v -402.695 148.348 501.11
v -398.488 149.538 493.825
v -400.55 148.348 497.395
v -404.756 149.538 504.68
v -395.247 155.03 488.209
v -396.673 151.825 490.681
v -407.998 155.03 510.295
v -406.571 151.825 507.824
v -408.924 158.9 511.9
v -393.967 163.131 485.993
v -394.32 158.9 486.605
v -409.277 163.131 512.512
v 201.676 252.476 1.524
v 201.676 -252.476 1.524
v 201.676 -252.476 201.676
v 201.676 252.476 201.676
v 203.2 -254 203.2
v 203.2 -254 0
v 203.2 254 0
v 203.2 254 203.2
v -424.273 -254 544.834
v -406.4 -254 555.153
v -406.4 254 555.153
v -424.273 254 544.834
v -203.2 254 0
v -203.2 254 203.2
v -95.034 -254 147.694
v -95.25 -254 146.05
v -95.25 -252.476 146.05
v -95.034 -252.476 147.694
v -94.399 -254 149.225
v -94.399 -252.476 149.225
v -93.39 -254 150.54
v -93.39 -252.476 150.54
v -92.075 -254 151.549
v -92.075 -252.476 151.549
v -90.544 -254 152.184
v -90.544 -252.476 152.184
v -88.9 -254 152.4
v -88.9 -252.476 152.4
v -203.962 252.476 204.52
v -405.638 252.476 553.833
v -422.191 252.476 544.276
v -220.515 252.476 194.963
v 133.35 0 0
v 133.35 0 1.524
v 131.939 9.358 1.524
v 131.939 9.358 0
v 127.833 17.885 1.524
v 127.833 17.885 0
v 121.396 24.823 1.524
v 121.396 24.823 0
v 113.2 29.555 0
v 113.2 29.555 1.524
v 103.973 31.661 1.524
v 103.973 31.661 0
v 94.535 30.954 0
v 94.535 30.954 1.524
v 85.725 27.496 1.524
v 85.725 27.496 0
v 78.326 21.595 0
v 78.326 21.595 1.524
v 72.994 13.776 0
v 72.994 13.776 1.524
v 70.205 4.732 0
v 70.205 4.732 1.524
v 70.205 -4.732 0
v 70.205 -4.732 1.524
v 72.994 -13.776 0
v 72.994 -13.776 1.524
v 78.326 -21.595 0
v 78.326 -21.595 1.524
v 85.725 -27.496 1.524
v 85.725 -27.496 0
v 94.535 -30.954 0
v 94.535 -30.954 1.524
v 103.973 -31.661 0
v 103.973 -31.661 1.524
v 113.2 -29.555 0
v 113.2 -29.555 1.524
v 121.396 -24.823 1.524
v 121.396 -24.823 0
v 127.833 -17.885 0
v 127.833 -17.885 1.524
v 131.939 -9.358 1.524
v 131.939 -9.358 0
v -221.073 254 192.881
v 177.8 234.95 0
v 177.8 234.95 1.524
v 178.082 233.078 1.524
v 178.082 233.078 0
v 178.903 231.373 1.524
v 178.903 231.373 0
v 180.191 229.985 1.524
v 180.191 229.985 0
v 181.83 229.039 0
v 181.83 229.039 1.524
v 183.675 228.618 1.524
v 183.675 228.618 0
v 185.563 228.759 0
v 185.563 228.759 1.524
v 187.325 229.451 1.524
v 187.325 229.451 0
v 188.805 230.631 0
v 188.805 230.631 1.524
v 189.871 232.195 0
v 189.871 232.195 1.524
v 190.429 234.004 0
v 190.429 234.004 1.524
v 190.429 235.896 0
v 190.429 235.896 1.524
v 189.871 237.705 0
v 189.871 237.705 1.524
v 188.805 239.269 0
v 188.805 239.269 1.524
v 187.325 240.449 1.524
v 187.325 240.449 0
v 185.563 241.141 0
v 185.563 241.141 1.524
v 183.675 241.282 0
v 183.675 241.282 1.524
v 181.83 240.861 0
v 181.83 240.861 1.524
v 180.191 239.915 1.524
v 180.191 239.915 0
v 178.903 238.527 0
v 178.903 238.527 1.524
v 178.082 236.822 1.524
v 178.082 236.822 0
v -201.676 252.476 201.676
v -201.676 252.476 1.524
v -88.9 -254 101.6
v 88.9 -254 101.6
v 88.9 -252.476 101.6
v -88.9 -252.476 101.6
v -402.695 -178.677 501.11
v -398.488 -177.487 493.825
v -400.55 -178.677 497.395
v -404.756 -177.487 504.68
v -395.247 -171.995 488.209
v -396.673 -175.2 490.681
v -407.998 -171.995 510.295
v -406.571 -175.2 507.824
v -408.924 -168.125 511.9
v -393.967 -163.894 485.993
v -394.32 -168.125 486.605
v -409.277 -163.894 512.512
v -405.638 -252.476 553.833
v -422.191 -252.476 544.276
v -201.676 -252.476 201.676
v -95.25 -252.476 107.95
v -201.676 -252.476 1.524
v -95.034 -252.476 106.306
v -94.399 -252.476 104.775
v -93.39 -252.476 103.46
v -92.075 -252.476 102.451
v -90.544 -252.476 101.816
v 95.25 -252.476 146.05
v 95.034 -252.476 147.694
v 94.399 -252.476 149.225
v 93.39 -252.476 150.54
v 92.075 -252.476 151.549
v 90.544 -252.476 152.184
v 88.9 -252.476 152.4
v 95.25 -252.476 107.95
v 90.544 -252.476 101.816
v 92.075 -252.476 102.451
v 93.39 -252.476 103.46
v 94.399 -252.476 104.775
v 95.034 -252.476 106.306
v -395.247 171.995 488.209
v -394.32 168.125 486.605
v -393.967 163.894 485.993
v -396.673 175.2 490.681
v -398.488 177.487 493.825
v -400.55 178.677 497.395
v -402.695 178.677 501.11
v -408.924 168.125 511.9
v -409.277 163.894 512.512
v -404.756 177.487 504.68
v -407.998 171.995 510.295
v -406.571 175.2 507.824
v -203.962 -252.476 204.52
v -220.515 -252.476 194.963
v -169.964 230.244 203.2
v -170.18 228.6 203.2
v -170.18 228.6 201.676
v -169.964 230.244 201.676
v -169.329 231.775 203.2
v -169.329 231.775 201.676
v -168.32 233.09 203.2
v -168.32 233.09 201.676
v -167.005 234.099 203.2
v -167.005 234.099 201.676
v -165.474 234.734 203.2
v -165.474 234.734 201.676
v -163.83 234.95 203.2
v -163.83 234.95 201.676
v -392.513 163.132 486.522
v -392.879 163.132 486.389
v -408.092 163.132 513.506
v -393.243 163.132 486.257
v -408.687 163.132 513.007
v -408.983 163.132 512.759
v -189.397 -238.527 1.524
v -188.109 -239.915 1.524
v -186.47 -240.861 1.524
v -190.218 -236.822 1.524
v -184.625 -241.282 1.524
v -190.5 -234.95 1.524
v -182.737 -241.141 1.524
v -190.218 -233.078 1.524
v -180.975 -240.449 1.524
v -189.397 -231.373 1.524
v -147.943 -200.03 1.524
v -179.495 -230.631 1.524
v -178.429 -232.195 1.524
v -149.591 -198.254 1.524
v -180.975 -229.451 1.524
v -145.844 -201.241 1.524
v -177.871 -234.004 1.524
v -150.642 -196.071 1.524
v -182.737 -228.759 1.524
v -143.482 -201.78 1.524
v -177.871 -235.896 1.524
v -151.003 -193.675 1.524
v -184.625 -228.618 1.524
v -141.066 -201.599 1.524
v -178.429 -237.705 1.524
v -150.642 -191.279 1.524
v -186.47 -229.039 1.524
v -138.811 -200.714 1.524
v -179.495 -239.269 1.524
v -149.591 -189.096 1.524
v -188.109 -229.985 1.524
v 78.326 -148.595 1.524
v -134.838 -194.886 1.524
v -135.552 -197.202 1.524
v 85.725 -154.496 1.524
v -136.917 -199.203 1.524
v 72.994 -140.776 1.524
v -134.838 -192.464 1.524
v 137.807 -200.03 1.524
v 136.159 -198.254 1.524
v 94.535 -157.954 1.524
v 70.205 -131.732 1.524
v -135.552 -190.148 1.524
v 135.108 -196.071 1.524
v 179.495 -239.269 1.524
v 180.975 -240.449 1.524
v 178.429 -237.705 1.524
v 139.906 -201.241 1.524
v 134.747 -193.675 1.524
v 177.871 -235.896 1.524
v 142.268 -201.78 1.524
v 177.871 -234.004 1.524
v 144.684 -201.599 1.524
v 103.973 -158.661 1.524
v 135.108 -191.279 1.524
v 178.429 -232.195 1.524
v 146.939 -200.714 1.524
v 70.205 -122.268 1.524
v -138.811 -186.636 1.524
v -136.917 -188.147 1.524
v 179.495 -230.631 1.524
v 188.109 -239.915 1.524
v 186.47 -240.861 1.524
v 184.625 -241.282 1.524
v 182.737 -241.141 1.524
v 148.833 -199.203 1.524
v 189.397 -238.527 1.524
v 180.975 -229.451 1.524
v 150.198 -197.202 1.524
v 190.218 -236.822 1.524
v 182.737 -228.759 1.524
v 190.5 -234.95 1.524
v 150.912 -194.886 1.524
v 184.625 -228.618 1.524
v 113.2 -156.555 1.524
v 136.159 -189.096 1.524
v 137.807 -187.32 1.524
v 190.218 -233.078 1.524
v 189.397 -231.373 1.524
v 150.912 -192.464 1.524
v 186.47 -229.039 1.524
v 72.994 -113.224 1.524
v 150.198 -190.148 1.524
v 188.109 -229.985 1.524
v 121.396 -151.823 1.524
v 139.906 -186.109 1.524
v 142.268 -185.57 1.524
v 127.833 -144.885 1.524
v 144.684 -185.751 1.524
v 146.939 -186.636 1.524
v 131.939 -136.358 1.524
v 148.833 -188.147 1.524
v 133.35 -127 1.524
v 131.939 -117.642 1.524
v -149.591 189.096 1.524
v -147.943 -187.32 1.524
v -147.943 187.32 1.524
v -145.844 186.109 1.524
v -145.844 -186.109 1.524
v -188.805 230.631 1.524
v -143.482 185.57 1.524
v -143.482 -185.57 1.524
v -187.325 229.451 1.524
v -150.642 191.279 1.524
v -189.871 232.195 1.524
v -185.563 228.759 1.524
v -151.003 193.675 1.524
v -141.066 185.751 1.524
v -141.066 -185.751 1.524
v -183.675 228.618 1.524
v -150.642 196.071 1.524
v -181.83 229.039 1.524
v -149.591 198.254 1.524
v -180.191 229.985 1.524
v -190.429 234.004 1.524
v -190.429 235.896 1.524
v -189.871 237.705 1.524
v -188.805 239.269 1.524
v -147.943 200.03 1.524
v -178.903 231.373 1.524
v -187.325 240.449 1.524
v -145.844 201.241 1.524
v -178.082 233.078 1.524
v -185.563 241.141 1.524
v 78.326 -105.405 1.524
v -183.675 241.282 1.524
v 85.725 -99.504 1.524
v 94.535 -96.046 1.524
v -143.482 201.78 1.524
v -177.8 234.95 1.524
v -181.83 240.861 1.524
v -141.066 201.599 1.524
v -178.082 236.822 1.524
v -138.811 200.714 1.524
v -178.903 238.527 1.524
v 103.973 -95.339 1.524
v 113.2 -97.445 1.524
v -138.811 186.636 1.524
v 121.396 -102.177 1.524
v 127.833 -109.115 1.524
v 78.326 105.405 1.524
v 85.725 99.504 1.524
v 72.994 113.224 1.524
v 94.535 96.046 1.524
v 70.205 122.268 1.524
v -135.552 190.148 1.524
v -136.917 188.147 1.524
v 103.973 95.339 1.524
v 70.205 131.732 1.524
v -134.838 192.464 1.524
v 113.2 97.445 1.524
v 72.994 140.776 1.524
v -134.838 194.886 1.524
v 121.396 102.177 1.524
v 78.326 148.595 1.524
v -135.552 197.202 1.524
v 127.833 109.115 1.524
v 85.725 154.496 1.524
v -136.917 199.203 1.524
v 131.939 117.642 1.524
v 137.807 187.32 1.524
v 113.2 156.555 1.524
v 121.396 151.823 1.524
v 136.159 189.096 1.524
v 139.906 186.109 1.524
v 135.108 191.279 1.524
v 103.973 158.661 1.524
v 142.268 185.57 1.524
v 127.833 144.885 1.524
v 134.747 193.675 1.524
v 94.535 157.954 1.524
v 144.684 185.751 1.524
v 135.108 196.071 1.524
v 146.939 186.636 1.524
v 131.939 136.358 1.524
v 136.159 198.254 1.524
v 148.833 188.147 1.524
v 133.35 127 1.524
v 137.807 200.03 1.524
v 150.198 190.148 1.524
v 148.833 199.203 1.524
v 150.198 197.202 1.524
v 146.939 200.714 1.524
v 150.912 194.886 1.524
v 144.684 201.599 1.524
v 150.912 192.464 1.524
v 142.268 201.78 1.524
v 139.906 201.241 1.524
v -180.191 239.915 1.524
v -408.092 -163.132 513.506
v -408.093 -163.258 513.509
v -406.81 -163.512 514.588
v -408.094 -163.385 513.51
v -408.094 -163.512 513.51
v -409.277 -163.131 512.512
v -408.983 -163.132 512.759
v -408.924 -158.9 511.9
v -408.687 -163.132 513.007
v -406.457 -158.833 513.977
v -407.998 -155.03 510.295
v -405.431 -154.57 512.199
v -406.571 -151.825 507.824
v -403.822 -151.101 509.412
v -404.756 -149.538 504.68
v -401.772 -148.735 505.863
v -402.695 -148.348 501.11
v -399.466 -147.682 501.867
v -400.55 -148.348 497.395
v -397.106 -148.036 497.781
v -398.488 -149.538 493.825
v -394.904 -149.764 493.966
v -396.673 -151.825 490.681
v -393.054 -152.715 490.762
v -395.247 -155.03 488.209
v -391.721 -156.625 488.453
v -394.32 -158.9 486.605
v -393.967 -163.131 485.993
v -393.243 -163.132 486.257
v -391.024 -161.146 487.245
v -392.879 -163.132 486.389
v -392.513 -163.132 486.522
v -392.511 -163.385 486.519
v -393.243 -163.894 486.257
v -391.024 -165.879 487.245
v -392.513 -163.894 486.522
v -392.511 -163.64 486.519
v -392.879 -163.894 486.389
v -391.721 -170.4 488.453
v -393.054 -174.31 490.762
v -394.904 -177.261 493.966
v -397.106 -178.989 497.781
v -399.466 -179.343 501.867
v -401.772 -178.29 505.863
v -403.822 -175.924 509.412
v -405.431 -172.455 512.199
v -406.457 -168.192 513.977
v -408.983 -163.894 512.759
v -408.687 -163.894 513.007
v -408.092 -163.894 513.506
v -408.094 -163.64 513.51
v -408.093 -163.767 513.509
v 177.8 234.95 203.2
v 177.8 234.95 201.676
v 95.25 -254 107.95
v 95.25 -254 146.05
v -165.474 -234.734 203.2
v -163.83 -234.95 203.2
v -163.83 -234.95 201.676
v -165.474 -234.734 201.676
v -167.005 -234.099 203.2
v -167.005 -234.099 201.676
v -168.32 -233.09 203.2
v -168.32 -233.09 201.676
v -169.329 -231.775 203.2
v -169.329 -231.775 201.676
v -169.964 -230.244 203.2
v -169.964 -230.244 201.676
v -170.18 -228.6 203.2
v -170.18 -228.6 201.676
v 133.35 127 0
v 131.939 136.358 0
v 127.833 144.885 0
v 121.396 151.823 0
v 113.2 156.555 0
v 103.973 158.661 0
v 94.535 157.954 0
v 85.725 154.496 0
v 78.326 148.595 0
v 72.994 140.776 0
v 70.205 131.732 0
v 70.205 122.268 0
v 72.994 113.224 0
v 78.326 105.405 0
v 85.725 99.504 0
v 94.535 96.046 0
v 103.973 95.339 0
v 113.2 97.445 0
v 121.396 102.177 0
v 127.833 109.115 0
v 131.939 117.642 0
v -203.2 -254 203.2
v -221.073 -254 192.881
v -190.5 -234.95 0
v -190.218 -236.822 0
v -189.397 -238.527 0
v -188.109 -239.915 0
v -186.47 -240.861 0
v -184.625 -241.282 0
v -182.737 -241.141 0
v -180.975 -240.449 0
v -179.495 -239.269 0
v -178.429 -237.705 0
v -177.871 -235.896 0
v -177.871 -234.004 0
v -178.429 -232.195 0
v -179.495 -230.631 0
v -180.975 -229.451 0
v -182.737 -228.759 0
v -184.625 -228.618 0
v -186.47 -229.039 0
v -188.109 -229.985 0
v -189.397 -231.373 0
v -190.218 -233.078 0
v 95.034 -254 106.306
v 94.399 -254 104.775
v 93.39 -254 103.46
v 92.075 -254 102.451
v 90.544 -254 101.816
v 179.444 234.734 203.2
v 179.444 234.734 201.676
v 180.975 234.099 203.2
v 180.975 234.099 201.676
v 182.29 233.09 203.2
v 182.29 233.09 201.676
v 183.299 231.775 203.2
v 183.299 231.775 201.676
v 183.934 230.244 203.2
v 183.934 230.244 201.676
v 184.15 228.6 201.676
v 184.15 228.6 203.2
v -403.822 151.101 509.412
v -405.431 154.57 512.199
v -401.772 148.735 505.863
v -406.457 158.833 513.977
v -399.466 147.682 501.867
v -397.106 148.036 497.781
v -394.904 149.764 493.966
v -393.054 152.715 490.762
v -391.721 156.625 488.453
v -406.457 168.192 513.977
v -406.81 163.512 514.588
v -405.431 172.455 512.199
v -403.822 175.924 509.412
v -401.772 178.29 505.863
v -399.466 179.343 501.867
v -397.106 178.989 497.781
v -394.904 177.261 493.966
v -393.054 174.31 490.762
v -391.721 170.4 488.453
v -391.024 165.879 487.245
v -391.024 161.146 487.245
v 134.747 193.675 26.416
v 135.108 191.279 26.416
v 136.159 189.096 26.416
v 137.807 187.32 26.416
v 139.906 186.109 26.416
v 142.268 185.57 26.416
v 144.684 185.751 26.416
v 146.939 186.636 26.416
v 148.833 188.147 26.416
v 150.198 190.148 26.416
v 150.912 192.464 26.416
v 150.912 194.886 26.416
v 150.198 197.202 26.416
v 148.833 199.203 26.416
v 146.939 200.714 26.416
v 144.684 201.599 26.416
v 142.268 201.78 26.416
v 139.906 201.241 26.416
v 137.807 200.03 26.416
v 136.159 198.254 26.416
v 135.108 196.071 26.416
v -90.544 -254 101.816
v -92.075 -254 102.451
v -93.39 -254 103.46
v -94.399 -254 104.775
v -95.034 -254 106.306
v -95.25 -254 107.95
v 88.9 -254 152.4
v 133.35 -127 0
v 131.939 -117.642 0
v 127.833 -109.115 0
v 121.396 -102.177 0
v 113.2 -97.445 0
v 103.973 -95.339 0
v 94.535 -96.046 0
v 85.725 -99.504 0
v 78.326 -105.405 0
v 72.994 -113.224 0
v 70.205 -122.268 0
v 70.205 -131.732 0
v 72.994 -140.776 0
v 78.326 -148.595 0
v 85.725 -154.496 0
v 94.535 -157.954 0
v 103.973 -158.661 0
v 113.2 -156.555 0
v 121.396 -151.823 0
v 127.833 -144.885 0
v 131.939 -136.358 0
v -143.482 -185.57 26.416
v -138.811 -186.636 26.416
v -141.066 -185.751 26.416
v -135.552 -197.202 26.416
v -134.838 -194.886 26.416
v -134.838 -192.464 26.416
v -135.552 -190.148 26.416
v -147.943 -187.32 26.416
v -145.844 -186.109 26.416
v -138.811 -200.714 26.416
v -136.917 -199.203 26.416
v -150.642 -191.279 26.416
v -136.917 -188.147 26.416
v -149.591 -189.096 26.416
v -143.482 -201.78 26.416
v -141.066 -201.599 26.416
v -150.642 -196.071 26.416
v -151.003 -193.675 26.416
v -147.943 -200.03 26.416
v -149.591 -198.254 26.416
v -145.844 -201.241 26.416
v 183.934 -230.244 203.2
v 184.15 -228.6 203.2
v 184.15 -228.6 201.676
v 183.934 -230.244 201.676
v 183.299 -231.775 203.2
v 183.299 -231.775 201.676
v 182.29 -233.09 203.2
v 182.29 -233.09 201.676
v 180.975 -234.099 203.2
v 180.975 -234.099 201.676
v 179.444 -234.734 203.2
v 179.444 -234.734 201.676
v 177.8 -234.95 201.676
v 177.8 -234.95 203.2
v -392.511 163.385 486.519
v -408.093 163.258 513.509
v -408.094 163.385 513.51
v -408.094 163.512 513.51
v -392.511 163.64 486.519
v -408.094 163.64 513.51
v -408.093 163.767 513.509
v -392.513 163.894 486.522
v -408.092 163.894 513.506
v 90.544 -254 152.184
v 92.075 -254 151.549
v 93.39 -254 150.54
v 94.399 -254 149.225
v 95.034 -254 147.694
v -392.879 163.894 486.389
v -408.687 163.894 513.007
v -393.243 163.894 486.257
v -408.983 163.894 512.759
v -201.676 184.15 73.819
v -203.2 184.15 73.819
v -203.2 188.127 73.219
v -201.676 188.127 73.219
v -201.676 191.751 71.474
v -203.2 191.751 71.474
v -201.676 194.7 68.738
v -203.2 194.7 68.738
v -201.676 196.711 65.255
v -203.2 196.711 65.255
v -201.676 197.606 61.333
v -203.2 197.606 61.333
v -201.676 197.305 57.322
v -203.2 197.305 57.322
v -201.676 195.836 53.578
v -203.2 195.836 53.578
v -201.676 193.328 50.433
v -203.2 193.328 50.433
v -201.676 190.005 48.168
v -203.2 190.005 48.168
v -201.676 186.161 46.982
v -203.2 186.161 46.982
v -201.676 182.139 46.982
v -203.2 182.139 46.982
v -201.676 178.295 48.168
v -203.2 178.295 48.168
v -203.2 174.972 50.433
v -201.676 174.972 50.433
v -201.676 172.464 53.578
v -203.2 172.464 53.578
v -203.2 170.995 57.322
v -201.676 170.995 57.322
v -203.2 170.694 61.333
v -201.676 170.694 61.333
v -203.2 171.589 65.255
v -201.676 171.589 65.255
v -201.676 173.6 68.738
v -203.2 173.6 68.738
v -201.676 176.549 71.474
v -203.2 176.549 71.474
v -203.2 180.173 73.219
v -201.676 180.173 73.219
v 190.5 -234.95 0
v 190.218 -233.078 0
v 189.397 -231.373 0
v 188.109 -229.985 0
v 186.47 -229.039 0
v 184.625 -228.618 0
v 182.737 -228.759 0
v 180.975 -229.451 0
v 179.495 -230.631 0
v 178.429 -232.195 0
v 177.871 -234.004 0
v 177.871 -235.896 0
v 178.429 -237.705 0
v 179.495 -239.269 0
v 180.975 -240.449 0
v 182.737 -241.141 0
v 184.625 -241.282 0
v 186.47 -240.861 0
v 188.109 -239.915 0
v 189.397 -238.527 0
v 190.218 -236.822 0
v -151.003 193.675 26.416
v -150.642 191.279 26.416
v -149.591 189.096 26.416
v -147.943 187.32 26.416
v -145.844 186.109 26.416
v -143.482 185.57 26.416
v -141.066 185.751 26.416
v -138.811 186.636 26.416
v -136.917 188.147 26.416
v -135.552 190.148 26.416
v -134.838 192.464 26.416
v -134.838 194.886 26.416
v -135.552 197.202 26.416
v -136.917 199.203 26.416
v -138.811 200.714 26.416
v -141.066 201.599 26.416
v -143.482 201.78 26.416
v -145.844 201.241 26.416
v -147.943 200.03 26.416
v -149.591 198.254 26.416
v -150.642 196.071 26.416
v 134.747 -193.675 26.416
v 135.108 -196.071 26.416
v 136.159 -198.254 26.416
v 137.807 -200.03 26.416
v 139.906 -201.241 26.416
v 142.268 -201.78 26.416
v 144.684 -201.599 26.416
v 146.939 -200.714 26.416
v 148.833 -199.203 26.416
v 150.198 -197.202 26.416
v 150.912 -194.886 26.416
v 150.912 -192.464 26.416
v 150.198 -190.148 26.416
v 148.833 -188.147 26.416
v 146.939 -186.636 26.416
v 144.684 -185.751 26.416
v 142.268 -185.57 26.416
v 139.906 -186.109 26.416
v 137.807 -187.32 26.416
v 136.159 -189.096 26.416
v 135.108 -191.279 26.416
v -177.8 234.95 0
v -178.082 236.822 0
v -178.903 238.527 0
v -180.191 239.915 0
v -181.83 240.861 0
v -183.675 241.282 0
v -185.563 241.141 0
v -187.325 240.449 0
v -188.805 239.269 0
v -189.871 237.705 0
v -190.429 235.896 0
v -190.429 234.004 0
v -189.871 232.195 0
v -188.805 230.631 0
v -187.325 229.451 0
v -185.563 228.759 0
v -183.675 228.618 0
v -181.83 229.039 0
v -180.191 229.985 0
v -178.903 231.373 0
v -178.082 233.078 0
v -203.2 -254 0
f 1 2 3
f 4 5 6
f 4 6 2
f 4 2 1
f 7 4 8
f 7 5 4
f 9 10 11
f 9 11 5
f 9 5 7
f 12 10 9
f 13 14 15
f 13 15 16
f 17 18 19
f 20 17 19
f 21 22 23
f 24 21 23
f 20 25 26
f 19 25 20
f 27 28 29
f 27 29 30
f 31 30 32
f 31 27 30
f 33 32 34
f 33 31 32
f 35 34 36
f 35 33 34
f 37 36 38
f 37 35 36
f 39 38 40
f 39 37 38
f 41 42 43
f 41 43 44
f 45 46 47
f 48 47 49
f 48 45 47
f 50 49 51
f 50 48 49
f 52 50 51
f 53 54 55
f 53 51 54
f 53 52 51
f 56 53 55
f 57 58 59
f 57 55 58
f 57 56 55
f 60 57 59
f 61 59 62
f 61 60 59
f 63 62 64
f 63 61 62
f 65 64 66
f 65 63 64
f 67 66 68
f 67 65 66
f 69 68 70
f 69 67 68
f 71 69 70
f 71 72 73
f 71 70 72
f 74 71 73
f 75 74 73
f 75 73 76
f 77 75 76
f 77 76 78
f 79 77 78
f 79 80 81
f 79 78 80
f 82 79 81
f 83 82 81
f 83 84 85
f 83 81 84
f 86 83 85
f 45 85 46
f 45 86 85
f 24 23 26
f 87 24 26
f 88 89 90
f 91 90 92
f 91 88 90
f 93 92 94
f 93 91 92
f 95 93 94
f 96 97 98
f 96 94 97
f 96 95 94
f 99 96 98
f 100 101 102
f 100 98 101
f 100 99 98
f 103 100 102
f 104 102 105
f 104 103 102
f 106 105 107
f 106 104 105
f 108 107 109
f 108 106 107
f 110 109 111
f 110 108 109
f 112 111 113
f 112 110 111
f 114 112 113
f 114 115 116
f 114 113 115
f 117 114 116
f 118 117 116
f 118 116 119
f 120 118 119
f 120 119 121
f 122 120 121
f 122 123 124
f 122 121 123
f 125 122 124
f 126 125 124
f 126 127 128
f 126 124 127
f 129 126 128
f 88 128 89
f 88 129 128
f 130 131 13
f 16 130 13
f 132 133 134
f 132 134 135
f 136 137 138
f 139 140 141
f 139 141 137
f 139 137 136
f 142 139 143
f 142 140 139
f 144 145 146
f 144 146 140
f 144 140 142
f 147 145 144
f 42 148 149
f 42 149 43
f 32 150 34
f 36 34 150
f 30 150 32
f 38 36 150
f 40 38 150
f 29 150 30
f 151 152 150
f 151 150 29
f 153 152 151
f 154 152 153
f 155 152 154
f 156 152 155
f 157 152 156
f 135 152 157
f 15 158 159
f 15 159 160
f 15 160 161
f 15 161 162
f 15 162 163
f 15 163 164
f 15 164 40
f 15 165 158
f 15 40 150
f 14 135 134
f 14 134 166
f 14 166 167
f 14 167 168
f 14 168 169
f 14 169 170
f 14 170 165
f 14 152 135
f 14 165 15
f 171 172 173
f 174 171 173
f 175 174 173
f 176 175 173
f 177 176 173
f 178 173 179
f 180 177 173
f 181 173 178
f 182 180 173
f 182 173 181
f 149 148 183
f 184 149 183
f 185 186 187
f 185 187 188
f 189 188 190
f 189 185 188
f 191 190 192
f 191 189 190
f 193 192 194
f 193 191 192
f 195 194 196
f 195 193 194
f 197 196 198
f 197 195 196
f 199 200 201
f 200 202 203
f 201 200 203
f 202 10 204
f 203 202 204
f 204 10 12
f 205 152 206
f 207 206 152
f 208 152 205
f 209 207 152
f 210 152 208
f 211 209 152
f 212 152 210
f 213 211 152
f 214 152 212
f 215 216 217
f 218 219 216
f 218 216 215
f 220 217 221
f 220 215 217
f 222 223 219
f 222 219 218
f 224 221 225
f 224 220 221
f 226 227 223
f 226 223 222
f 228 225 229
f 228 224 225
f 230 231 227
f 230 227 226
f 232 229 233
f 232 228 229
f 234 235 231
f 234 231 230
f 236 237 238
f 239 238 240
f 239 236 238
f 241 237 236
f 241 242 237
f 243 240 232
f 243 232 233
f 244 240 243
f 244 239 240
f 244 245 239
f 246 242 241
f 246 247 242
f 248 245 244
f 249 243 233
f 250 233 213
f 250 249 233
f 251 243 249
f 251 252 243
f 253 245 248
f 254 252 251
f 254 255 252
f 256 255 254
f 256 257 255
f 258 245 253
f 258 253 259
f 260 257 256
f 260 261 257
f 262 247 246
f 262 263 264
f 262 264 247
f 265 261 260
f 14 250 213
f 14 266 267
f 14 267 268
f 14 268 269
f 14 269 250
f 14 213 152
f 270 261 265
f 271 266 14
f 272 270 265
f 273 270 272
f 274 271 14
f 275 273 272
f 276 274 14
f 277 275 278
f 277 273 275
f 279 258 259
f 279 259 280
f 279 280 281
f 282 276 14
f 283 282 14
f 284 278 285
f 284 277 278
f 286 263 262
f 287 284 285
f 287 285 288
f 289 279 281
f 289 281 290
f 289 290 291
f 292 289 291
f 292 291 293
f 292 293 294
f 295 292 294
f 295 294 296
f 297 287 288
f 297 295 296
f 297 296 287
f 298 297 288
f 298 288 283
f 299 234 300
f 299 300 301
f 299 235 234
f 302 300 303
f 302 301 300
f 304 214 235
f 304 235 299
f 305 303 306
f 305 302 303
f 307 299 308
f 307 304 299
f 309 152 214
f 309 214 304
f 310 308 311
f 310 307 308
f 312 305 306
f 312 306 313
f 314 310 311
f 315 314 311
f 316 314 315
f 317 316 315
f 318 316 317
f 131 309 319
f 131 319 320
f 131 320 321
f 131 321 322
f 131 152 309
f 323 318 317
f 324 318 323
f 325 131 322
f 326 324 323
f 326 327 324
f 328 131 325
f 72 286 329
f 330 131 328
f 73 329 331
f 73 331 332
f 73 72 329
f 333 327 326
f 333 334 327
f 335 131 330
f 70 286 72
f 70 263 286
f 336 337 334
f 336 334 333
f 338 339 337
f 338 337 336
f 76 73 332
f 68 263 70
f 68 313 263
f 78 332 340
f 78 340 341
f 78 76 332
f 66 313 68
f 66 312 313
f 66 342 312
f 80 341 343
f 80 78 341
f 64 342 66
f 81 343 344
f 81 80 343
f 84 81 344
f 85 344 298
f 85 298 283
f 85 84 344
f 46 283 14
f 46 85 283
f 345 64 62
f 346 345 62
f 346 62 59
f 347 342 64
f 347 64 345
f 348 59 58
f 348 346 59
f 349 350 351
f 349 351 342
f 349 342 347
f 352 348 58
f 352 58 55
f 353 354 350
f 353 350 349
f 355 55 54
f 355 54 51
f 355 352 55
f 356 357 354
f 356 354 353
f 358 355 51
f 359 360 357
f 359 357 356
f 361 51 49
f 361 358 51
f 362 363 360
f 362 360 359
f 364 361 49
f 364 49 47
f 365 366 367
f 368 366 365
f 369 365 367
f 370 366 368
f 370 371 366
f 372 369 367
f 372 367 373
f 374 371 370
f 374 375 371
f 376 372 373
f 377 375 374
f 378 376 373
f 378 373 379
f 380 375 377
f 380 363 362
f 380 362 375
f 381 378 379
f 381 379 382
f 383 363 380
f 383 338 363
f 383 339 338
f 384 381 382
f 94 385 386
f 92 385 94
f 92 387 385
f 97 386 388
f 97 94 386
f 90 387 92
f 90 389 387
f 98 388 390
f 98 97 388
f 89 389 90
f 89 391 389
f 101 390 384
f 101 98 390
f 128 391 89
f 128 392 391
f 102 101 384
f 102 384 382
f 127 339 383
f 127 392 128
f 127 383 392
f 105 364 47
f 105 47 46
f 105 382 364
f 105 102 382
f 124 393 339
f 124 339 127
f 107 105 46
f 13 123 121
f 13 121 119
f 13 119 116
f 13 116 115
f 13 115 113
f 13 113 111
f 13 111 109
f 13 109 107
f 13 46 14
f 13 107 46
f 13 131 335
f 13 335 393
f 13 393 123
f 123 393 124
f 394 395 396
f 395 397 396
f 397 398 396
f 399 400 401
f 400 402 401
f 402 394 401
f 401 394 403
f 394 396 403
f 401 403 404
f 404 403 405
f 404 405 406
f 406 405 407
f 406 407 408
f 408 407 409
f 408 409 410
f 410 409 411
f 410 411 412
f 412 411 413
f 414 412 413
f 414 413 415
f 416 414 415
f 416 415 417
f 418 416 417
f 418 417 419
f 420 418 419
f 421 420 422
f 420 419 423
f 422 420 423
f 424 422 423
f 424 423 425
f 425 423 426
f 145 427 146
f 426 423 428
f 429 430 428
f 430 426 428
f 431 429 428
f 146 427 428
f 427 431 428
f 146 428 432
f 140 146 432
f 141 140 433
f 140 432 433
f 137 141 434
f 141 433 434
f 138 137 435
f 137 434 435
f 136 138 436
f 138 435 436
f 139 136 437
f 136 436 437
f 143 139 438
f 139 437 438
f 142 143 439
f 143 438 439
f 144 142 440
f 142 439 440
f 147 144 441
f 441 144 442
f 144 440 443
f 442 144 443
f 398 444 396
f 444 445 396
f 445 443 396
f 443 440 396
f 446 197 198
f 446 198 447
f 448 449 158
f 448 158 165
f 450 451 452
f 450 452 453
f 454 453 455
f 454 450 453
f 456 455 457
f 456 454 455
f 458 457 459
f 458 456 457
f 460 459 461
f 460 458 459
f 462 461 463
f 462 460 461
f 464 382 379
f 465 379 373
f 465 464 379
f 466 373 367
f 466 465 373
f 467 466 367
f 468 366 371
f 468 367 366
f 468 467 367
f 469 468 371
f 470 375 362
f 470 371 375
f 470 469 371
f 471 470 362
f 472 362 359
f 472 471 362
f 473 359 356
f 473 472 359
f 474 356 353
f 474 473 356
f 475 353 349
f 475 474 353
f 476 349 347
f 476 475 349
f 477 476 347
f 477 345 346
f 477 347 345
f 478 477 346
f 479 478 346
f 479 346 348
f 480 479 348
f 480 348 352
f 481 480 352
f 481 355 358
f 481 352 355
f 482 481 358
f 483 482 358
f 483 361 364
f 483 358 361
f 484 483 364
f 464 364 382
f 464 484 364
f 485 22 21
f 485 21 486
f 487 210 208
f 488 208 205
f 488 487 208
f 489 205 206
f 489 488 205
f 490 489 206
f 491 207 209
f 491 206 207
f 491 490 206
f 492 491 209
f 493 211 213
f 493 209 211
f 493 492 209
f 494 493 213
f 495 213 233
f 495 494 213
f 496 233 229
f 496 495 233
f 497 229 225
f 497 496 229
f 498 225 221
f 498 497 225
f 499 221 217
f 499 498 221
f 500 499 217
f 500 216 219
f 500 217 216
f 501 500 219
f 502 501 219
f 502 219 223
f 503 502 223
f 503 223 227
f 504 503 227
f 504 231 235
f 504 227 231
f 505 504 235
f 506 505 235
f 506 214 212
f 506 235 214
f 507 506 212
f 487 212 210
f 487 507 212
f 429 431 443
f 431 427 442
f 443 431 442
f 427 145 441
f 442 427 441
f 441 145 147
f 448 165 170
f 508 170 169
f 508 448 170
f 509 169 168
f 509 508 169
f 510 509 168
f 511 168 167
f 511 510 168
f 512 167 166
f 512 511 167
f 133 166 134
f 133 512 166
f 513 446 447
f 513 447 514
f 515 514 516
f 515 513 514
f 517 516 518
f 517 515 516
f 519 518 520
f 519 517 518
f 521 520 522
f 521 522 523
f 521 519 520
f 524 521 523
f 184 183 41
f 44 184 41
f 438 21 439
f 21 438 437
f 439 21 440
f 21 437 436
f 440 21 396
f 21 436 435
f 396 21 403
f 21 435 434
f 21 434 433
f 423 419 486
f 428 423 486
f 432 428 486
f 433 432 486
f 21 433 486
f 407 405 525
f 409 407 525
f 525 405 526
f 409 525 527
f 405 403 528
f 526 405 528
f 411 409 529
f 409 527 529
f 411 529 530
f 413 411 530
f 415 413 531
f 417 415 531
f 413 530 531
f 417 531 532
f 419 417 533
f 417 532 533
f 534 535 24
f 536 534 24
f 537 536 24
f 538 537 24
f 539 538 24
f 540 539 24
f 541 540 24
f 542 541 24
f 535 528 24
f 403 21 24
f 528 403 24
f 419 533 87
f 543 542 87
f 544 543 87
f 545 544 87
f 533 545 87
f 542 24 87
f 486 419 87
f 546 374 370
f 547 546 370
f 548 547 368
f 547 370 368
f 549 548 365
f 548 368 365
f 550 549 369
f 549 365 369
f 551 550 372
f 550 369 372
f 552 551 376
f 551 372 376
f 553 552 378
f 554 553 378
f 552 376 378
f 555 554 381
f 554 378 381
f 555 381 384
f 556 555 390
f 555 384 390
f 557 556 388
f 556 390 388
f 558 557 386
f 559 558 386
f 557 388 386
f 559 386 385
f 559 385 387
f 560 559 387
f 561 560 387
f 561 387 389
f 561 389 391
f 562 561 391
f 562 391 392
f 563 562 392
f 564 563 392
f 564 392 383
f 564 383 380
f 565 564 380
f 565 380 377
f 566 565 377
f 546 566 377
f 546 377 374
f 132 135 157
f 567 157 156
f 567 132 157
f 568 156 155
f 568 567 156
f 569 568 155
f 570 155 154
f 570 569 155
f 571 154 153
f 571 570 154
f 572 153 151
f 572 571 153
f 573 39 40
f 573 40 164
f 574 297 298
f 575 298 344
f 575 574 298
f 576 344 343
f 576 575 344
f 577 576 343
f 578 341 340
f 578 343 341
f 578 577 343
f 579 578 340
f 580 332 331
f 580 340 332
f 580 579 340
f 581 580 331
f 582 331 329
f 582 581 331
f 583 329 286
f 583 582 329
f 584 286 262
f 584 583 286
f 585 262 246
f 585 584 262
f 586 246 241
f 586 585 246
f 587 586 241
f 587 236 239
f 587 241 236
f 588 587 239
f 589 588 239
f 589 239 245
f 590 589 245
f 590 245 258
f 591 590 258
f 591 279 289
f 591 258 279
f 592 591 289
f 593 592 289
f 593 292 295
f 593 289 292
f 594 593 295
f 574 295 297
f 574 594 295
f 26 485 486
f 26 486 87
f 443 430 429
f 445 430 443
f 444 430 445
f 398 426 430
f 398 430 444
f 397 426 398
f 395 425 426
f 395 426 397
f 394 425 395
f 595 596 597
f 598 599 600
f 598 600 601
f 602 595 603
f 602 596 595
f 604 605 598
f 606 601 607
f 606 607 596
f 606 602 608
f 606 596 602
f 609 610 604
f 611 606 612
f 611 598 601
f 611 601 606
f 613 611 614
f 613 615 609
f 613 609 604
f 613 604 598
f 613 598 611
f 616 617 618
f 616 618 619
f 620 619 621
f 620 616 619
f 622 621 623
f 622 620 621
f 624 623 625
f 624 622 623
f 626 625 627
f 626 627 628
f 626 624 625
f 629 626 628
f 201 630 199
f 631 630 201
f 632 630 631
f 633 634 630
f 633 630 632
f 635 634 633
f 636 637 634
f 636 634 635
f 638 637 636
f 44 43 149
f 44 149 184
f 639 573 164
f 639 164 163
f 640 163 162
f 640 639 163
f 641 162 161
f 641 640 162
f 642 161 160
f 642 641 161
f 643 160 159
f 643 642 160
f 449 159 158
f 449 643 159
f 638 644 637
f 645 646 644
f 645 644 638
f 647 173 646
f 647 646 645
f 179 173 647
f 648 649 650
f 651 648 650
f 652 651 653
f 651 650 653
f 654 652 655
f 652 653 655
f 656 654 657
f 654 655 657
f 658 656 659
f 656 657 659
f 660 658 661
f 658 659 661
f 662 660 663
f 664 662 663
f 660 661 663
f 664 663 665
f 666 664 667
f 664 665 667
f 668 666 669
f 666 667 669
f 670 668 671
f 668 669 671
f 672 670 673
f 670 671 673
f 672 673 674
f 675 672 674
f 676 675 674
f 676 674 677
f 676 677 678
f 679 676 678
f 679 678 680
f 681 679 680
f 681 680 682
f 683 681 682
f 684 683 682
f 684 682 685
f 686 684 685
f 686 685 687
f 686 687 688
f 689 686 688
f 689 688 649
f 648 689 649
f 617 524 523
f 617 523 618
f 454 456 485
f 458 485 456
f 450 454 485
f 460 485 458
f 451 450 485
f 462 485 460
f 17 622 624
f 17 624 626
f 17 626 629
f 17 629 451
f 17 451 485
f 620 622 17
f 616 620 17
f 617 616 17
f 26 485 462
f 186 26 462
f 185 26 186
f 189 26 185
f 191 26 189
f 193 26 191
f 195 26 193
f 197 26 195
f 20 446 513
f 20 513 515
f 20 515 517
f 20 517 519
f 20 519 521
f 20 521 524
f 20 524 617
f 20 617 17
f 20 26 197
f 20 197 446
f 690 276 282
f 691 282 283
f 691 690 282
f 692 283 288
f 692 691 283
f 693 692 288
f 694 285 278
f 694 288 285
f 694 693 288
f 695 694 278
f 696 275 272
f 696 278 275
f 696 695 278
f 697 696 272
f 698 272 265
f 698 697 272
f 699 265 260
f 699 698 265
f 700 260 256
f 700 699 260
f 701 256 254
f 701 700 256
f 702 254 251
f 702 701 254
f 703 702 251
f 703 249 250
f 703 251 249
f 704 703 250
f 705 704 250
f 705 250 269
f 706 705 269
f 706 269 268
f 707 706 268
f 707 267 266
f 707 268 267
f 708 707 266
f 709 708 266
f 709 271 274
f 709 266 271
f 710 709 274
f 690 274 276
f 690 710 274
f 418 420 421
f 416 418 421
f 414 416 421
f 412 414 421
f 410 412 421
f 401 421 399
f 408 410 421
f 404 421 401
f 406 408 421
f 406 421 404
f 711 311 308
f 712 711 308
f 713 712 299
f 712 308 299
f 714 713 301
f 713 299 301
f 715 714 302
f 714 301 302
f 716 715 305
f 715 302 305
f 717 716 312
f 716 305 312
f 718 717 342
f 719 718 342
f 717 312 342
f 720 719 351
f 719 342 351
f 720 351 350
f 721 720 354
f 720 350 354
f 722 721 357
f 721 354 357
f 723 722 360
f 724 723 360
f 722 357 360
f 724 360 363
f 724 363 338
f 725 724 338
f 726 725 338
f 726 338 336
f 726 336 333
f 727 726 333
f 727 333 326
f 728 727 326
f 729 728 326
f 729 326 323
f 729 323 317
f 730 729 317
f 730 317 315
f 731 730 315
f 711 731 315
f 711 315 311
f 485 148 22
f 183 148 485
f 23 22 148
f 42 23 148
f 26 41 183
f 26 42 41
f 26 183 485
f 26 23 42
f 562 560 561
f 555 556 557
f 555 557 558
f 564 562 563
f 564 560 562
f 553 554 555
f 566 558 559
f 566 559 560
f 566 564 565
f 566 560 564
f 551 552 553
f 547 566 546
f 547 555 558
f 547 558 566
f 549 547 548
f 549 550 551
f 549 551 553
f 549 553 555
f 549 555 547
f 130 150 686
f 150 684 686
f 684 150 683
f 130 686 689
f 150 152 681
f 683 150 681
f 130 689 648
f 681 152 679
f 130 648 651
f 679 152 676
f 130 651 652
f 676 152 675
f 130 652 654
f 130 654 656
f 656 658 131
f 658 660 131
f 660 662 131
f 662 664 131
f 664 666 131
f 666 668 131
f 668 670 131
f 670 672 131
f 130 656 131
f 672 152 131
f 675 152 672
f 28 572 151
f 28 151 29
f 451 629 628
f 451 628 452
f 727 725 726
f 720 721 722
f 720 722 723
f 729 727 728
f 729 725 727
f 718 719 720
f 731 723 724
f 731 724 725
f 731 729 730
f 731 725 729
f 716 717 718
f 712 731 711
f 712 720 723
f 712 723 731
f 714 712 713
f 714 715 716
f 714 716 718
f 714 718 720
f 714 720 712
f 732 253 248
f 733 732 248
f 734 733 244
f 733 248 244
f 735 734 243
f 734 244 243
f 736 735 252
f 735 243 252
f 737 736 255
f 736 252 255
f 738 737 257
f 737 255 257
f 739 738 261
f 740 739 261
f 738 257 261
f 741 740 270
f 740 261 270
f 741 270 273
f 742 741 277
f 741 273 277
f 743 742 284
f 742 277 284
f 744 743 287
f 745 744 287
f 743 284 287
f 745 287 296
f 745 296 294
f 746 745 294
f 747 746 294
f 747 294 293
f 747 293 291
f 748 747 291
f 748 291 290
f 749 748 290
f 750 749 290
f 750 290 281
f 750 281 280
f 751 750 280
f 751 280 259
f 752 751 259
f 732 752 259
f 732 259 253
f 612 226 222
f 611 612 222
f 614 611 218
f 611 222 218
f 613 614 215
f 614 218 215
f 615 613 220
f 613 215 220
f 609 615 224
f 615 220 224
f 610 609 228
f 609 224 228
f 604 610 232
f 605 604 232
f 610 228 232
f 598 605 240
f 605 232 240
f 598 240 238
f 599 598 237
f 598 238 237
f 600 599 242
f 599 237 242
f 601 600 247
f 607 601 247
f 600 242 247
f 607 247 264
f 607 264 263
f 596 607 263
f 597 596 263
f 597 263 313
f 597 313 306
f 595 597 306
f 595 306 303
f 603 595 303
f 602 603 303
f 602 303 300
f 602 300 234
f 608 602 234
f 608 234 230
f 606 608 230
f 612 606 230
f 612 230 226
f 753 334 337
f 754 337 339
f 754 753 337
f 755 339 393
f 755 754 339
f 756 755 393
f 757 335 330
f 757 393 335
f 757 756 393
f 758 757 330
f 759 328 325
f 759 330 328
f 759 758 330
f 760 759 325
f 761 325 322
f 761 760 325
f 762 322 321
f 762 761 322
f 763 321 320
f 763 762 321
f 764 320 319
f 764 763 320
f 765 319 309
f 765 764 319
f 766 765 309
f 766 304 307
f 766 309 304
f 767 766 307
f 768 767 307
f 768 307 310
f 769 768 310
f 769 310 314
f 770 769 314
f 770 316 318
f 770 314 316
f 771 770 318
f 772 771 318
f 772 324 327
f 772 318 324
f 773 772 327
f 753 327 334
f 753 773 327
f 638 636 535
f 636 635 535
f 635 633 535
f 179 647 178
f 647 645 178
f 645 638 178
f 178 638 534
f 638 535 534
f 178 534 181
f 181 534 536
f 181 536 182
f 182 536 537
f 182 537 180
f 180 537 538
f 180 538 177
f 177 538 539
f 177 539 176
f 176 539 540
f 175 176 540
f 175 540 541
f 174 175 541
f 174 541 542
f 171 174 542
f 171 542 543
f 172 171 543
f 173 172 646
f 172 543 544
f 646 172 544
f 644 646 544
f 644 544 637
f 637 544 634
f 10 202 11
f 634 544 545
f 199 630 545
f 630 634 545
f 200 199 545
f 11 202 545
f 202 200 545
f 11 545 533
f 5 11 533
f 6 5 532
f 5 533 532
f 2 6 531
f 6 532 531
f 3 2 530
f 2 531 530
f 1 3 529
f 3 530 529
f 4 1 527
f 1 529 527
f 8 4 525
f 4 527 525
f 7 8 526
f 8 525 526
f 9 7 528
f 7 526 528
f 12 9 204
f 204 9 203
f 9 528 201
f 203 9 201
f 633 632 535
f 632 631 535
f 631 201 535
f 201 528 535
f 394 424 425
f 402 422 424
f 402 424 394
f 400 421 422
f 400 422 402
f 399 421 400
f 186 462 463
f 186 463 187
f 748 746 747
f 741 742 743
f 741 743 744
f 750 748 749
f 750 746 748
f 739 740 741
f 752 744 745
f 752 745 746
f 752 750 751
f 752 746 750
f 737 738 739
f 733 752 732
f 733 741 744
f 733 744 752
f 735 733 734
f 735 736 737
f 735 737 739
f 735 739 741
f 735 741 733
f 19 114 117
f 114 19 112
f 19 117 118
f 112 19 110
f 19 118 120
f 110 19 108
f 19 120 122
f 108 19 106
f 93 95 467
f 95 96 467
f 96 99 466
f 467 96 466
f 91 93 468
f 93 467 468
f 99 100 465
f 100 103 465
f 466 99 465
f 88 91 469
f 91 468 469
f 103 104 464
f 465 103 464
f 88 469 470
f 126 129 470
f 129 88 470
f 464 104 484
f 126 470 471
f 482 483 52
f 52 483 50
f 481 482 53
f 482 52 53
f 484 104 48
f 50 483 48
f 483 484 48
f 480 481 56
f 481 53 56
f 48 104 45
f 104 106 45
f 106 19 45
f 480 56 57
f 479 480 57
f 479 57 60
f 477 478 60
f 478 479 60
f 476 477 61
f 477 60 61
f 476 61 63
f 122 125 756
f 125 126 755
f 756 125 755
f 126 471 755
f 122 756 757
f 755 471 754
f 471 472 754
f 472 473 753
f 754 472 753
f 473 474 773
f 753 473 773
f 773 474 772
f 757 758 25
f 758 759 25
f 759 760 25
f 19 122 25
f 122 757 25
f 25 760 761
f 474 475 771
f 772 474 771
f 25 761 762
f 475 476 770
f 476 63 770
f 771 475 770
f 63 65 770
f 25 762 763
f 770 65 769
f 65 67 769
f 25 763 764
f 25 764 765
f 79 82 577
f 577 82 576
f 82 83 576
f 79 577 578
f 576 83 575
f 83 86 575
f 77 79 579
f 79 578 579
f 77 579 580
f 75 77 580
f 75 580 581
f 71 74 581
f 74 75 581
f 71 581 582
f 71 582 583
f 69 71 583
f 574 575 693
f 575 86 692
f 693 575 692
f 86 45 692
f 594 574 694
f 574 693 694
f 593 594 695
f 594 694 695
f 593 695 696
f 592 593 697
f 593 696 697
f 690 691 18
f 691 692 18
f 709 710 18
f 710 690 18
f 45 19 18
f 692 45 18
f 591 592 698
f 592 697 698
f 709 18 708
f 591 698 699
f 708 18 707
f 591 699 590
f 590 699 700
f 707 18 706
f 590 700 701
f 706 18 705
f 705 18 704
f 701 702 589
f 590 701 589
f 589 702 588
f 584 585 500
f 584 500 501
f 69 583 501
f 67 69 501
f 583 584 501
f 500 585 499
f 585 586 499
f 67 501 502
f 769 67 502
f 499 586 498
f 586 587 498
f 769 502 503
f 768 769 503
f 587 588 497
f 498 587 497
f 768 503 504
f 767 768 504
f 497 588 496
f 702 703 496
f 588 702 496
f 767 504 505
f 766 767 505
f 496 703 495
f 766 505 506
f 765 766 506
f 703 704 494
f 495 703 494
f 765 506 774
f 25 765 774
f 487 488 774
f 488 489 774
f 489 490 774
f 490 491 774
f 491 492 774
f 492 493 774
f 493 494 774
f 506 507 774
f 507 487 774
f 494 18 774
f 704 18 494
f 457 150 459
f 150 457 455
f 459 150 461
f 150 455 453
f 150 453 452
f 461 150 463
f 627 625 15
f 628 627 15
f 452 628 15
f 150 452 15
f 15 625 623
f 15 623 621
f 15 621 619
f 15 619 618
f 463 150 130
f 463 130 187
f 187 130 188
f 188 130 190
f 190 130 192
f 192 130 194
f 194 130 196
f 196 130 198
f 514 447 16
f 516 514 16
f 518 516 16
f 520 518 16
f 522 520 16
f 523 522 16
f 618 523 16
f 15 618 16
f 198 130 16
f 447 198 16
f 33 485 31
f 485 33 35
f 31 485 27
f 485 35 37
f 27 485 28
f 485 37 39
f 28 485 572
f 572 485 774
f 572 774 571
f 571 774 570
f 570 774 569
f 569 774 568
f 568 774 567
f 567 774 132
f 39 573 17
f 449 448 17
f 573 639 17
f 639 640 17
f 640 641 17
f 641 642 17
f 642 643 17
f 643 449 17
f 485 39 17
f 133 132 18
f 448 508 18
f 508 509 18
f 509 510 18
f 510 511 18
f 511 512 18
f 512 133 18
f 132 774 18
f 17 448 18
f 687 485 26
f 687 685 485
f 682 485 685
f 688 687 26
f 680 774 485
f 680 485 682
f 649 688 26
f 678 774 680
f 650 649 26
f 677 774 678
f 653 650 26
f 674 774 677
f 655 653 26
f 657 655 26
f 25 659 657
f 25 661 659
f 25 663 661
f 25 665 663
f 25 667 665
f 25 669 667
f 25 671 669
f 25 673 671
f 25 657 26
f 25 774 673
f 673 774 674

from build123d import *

# Parameters (mm, degrees)
SKETCH1_W                = 406.4
SKETCH1_H                = 508
EXTRUDE1_DEPTH           = 203.2
SHELL1_T                 = -1.524
SKETCH2_R                = 6.35
CUT_EXTRUDE1_DEPTH       = 384.531589312
SKETCH6_W                = 406.4
SKETCH6_H                = 508
EXTRUDE3_DEPTH           = 1.524
SKETCH4_W                = 406.4
SKETCH4_H                = 508
EXTRUDE2_DEPTH           = 20.6375
SHELL2_T                 = -1.524
SKETCH7_R                = 13.49375
CUT_EXTRUDE2_DEPTH       = 2.54
SKETCH9_R                = 15.875
EXTRUDE5_DEPTH           = 3.175
EXTRUDE5_DRAFT           = 10
EXTRUDE5_PROFILE_2_DEPTH = 3.175
EXTRUDE5_PROFILE_2_DRAFT = 10
SKETCH10_W               = 391.049820908
SKETCH10_H               = 0.762
CUT_EXTRUDE3_DEPTH       = 1.524
SKETCH11_R               = 8.128
EXTRUDE6_DEPTH           = 26.416
SKETCH12_R               = 31.75
CUT_EXTRUDE5_DEPTH       = 2.54
CUT_EXTRUDE6_DEPTH       = 12.7


with BuildPart() as part:
    # Sketch1 → Extrude1 (new body)
    with BuildSketch(Plane.XY):
        Rectangle(SKETCH1_W, SKETCH1_H)
    extrude(amount=EXTRUDE1_DEPTH)

    # Shell1
    shell1_openings = [part.faces().sort_by_distance(p)[0] for p in [
        (0, 0, 203.2),
    ]]
    offset(amount=SHELL1_T, openings=shell1_openings, kind=Kind.INTERSECTION)

    # Sketch2 → Cut-Extrude1 (cut, through all)
    with BuildSketch(Plane.XY):
        with Locations((184.15, -234.95)):
            Circle(SKETCH2_R)
        with Locations(Location((-184.15, -234.95, 0), (0, 0, 180))):
            Circle(SKETCH2_R)
        with Locations(Location((184.15, 234.95, 0), (0, 0, 180))):
            Circle(SKETCH2_R)
        with Locations((-184.15, 234.95)):
            Circle(SKETCH2_R)
    extrude(amount=CUT_EXTRUDE1_DEPTH, mode=Mode.SUBTRACT)

    # Sketch6 → Extrude3 (add)
    with BuildSketch(Plane.XY.offset(203.2)):
        Rectangle(SKETCH6_W, SKETCH6_H)
        with BuildLine():
            Line((-163.83, 234.95), (177.8, 234.95))
            ThreePointArc((177.8, 234.95), (182.290128061, 233.090128061), (184.15, 228.6))
            Line((184.15, 228.6), (184.15, -228.6))
            ThreePointArc((184.15, -228.6), (182.290128061, -233.090128061), (177.8, -234.95))
            Line((177.8, -234.95), (-163.83, -234.95))
            ThreePointArc((-163.83, -234.95), (-168.320128061, -233.090128061), (-170.18, -228.6))
            Line((-170.18, -228.6), (-170.18, 228.6))
            ThreePointArc((-170.18, 228.6), (-168.320128061, 233.090128061), (-163.83, 234.95))
        make_face(mode=Mode.SUBTRACT)
    extrude(amount=-EXTRUDE3_DEPTH)

    # Sketch7 → Cut-Extrude2 (cut)
    with BuildSketch(Plane.ZY.offset(203.2)):
        with Locations((60.325, 184.15)):
            Circle(SKETCH7_R)
    extrude(amount=-CUT_EXTRUDE2_DEPTH, mode=Mode.SUBTRACT)

    # Sketch11 → Extrude6 (add)
    with BuildSketch(Plane.XY):
        with Locations(Location((142.875, 193.675, 0), (0, 0, 180))):
            Circle(SKETCH11_R)
        with Locations(Location((-142.875, 193.675, 0), (0, 0, 180))):
            Circle(SKETCH11_R)
        with Locations(Location((142.875, -193.675, 0), (0, 0, 180))):
            Circle(SKETCH11_R)
        with Locations(Location((-142.875, -193.675, 0), (0, 0, 180))):
            Circle(SKETCH11_R)
    extrude(amount=EXTRUDE6_DEPTH)

    # Sketch12 → Cut-Extrude5 (cut)
    with BuildSketch(Plane.XY):
        with Locations((101.6, 0)):
            Circle(SKETCH12_R)
        with Locations((101.6, -127)):
            Circle(SKETCH12_R)
        with Locations((101.6, 127)):
            Circle(SKETCH12_R)
    extrude(amount=CUT_EXTRUDE5_DEPTH, mode=Mode.SUBTRACT)

    # Sketch14 → Cut-Extrude6 (cut)
    with BuildSketch(Plane.XZ.offset(254)):
        with BuildLine():
            Line((-88.9, 152.4), (88.9, 152.4))
            ThreePointArc((88.9, 152.4), (93.390128061, 150.540128061), (95.25, 146.05))
            Line((95.25, 146.05), (95.25, 107.95))
            ThreePointArc((95.25, 107.95), (93.390128061, 103.459871939), (88.9, 101.6))
            Line((88.9, 101.6), (-88.9, 101.6))
            ThreePointArc((-88.9, 101.6), (-93.390128061, 103.459871939), (-95.25, 107.95))
            Line((-95.25, 107.95), (-95.25, 146.05))
            ThreePointArc((-95.25, 146.05), (-93.390128061, 150.540128061), (-88.9, 152.4))
        make_face()
    extrude(amount=-CUT_EXTRUDE6_DEPTH, mode=Mode.SUBTRACT)


with BuildPart() as body_2:
    # Sketch4 → Extrude2 (new body)
    with BuildSketch(Plane(origin=(-287.262584572, 0, 348.800667495), x_dir=(0.4999999999999948, 0, -0.8660254037844417), z_dir=(0.8660254037844417, 0, 0.4999999999999948))):
        with Locations((-35.074830855, 0)):
            Rectangle(SKETCH4_W, SKETCH4_H)
    extrude(amount=-EXTRUDE2_DEPTH)

    # Shell2
    shell2_openings = [body_2.faces().sort_by_distance(p)[0] for p in [
        (-304.8, 0, 379.176362049),
    ]]
    offset(amount=SHELL2_T, openings=shell2_openings, kind=Kind.INTERSECTION)


with BuildPart() as extrude5_tool:
    # Sketch9 → Extrude5 (with draft: the straight prism first)
    with BuildSketch(Plane(origin=(-82.284418246, 0, -47.506931024), x_dir=(-0.49999999999999467, 0, 0.8660254037844417), z_dir=(-0.8660254037844417, 0, -0.49999999999999467))):
        with Locations((633.176362049, 163.5125)):
            Circle(SKETCH9_R)
    extrude(amount=EXTRUDE5_DEPTH)
    # Extrude5: the draft: its side faces are tilted about the plane it starts from
    extrude5_sides = [extrude5_tool.faces().sort_by_distance(p)[0] for p in [
        (-392.309914599, 163.5125, 486.297980301),
    ]]
    draft(extrude5_sides, Plane(origin=(-82.284418246, 0, -47.506931024), x_dir=(-0.49999999999999467, 0, 0.8660254037844417), z_dir=(-0.8660254037844417, 0, -0.49999999999999467)), EXTRUDE5_DRAFT)


with BuildPart() as body_2_1:
    add(body_2.part)

    # Extrude5: add extrude5_tool
    add(extrude5_tool.part)


with BuildPart() as extrude5_profile_2_tool:
    # Sketch9 → Extrude5 profile 2 (with draft: the straight prism first)
    with BuildSketch(Plane(origin=(-82.284418246, 0, -47.506931024), x_dir=(-0.49999999999999467, 0, 0.8660254037844417), z_dir=(-0.8660254037844417, 0, -0.49999999999999467))):
        with Locations((633.176362049, -163.5125)):
            Circle(SKETCH9_R)
    extrude(amount=EXTRUDE5_PROFILE_2_DEPTH)
    # Extrude5 profile 2: the draft: its side faces are tilted about the plane it starts from
    extrude5_profile_2_sides = [extrude5_profile_2_tool.faces().sort_by_distance(p)[0] for p in [
        (-392.309914599, -163.5125, 486.297980301),
    ]]
    draft(extrude5_profile_2_sides, Plane(origin=(-82.284418246, 0, -47.506931024), x_dir=(-0.49999999999999467, 0, 0.8660254037844417), z_dir=(-0.8660254037844417, 0, -0.49999999999999467)), EXTRUDE5_PROFILE_2_DRAFT)


with BuildPart() as body_2_2:
    add(body_2_1.part)

    # Extrude5 profile 2: add extrude5_profile_2_tool
    add(extrude5_profile_2_tool.part)

    # Sketch10 → Cut-Extrude3 (cut)
    with BuildSketch(Plane(origin=(-85.034048903, 0, -49.094431024), x_dir=(-0.4999999999999946, 0, 0.8660254037844417), z_dir=(-0.8660254037844417, 0, -0.4999999999999946))):
        with Locations((633.176362049, -163.5125)):
            Rectangle(SKETCH10_W, SKETCH10_H)
        with Locations((633.176362049, 163.5125)):
            Rectangle(SKETCH10_W, SKETCH10_H)
    extrude(amount=-CUT_EXTRUDE3_DEPTH, mode=Mode.SUBTRACT)


solid = Compound([part.part, body_2_2.part])
